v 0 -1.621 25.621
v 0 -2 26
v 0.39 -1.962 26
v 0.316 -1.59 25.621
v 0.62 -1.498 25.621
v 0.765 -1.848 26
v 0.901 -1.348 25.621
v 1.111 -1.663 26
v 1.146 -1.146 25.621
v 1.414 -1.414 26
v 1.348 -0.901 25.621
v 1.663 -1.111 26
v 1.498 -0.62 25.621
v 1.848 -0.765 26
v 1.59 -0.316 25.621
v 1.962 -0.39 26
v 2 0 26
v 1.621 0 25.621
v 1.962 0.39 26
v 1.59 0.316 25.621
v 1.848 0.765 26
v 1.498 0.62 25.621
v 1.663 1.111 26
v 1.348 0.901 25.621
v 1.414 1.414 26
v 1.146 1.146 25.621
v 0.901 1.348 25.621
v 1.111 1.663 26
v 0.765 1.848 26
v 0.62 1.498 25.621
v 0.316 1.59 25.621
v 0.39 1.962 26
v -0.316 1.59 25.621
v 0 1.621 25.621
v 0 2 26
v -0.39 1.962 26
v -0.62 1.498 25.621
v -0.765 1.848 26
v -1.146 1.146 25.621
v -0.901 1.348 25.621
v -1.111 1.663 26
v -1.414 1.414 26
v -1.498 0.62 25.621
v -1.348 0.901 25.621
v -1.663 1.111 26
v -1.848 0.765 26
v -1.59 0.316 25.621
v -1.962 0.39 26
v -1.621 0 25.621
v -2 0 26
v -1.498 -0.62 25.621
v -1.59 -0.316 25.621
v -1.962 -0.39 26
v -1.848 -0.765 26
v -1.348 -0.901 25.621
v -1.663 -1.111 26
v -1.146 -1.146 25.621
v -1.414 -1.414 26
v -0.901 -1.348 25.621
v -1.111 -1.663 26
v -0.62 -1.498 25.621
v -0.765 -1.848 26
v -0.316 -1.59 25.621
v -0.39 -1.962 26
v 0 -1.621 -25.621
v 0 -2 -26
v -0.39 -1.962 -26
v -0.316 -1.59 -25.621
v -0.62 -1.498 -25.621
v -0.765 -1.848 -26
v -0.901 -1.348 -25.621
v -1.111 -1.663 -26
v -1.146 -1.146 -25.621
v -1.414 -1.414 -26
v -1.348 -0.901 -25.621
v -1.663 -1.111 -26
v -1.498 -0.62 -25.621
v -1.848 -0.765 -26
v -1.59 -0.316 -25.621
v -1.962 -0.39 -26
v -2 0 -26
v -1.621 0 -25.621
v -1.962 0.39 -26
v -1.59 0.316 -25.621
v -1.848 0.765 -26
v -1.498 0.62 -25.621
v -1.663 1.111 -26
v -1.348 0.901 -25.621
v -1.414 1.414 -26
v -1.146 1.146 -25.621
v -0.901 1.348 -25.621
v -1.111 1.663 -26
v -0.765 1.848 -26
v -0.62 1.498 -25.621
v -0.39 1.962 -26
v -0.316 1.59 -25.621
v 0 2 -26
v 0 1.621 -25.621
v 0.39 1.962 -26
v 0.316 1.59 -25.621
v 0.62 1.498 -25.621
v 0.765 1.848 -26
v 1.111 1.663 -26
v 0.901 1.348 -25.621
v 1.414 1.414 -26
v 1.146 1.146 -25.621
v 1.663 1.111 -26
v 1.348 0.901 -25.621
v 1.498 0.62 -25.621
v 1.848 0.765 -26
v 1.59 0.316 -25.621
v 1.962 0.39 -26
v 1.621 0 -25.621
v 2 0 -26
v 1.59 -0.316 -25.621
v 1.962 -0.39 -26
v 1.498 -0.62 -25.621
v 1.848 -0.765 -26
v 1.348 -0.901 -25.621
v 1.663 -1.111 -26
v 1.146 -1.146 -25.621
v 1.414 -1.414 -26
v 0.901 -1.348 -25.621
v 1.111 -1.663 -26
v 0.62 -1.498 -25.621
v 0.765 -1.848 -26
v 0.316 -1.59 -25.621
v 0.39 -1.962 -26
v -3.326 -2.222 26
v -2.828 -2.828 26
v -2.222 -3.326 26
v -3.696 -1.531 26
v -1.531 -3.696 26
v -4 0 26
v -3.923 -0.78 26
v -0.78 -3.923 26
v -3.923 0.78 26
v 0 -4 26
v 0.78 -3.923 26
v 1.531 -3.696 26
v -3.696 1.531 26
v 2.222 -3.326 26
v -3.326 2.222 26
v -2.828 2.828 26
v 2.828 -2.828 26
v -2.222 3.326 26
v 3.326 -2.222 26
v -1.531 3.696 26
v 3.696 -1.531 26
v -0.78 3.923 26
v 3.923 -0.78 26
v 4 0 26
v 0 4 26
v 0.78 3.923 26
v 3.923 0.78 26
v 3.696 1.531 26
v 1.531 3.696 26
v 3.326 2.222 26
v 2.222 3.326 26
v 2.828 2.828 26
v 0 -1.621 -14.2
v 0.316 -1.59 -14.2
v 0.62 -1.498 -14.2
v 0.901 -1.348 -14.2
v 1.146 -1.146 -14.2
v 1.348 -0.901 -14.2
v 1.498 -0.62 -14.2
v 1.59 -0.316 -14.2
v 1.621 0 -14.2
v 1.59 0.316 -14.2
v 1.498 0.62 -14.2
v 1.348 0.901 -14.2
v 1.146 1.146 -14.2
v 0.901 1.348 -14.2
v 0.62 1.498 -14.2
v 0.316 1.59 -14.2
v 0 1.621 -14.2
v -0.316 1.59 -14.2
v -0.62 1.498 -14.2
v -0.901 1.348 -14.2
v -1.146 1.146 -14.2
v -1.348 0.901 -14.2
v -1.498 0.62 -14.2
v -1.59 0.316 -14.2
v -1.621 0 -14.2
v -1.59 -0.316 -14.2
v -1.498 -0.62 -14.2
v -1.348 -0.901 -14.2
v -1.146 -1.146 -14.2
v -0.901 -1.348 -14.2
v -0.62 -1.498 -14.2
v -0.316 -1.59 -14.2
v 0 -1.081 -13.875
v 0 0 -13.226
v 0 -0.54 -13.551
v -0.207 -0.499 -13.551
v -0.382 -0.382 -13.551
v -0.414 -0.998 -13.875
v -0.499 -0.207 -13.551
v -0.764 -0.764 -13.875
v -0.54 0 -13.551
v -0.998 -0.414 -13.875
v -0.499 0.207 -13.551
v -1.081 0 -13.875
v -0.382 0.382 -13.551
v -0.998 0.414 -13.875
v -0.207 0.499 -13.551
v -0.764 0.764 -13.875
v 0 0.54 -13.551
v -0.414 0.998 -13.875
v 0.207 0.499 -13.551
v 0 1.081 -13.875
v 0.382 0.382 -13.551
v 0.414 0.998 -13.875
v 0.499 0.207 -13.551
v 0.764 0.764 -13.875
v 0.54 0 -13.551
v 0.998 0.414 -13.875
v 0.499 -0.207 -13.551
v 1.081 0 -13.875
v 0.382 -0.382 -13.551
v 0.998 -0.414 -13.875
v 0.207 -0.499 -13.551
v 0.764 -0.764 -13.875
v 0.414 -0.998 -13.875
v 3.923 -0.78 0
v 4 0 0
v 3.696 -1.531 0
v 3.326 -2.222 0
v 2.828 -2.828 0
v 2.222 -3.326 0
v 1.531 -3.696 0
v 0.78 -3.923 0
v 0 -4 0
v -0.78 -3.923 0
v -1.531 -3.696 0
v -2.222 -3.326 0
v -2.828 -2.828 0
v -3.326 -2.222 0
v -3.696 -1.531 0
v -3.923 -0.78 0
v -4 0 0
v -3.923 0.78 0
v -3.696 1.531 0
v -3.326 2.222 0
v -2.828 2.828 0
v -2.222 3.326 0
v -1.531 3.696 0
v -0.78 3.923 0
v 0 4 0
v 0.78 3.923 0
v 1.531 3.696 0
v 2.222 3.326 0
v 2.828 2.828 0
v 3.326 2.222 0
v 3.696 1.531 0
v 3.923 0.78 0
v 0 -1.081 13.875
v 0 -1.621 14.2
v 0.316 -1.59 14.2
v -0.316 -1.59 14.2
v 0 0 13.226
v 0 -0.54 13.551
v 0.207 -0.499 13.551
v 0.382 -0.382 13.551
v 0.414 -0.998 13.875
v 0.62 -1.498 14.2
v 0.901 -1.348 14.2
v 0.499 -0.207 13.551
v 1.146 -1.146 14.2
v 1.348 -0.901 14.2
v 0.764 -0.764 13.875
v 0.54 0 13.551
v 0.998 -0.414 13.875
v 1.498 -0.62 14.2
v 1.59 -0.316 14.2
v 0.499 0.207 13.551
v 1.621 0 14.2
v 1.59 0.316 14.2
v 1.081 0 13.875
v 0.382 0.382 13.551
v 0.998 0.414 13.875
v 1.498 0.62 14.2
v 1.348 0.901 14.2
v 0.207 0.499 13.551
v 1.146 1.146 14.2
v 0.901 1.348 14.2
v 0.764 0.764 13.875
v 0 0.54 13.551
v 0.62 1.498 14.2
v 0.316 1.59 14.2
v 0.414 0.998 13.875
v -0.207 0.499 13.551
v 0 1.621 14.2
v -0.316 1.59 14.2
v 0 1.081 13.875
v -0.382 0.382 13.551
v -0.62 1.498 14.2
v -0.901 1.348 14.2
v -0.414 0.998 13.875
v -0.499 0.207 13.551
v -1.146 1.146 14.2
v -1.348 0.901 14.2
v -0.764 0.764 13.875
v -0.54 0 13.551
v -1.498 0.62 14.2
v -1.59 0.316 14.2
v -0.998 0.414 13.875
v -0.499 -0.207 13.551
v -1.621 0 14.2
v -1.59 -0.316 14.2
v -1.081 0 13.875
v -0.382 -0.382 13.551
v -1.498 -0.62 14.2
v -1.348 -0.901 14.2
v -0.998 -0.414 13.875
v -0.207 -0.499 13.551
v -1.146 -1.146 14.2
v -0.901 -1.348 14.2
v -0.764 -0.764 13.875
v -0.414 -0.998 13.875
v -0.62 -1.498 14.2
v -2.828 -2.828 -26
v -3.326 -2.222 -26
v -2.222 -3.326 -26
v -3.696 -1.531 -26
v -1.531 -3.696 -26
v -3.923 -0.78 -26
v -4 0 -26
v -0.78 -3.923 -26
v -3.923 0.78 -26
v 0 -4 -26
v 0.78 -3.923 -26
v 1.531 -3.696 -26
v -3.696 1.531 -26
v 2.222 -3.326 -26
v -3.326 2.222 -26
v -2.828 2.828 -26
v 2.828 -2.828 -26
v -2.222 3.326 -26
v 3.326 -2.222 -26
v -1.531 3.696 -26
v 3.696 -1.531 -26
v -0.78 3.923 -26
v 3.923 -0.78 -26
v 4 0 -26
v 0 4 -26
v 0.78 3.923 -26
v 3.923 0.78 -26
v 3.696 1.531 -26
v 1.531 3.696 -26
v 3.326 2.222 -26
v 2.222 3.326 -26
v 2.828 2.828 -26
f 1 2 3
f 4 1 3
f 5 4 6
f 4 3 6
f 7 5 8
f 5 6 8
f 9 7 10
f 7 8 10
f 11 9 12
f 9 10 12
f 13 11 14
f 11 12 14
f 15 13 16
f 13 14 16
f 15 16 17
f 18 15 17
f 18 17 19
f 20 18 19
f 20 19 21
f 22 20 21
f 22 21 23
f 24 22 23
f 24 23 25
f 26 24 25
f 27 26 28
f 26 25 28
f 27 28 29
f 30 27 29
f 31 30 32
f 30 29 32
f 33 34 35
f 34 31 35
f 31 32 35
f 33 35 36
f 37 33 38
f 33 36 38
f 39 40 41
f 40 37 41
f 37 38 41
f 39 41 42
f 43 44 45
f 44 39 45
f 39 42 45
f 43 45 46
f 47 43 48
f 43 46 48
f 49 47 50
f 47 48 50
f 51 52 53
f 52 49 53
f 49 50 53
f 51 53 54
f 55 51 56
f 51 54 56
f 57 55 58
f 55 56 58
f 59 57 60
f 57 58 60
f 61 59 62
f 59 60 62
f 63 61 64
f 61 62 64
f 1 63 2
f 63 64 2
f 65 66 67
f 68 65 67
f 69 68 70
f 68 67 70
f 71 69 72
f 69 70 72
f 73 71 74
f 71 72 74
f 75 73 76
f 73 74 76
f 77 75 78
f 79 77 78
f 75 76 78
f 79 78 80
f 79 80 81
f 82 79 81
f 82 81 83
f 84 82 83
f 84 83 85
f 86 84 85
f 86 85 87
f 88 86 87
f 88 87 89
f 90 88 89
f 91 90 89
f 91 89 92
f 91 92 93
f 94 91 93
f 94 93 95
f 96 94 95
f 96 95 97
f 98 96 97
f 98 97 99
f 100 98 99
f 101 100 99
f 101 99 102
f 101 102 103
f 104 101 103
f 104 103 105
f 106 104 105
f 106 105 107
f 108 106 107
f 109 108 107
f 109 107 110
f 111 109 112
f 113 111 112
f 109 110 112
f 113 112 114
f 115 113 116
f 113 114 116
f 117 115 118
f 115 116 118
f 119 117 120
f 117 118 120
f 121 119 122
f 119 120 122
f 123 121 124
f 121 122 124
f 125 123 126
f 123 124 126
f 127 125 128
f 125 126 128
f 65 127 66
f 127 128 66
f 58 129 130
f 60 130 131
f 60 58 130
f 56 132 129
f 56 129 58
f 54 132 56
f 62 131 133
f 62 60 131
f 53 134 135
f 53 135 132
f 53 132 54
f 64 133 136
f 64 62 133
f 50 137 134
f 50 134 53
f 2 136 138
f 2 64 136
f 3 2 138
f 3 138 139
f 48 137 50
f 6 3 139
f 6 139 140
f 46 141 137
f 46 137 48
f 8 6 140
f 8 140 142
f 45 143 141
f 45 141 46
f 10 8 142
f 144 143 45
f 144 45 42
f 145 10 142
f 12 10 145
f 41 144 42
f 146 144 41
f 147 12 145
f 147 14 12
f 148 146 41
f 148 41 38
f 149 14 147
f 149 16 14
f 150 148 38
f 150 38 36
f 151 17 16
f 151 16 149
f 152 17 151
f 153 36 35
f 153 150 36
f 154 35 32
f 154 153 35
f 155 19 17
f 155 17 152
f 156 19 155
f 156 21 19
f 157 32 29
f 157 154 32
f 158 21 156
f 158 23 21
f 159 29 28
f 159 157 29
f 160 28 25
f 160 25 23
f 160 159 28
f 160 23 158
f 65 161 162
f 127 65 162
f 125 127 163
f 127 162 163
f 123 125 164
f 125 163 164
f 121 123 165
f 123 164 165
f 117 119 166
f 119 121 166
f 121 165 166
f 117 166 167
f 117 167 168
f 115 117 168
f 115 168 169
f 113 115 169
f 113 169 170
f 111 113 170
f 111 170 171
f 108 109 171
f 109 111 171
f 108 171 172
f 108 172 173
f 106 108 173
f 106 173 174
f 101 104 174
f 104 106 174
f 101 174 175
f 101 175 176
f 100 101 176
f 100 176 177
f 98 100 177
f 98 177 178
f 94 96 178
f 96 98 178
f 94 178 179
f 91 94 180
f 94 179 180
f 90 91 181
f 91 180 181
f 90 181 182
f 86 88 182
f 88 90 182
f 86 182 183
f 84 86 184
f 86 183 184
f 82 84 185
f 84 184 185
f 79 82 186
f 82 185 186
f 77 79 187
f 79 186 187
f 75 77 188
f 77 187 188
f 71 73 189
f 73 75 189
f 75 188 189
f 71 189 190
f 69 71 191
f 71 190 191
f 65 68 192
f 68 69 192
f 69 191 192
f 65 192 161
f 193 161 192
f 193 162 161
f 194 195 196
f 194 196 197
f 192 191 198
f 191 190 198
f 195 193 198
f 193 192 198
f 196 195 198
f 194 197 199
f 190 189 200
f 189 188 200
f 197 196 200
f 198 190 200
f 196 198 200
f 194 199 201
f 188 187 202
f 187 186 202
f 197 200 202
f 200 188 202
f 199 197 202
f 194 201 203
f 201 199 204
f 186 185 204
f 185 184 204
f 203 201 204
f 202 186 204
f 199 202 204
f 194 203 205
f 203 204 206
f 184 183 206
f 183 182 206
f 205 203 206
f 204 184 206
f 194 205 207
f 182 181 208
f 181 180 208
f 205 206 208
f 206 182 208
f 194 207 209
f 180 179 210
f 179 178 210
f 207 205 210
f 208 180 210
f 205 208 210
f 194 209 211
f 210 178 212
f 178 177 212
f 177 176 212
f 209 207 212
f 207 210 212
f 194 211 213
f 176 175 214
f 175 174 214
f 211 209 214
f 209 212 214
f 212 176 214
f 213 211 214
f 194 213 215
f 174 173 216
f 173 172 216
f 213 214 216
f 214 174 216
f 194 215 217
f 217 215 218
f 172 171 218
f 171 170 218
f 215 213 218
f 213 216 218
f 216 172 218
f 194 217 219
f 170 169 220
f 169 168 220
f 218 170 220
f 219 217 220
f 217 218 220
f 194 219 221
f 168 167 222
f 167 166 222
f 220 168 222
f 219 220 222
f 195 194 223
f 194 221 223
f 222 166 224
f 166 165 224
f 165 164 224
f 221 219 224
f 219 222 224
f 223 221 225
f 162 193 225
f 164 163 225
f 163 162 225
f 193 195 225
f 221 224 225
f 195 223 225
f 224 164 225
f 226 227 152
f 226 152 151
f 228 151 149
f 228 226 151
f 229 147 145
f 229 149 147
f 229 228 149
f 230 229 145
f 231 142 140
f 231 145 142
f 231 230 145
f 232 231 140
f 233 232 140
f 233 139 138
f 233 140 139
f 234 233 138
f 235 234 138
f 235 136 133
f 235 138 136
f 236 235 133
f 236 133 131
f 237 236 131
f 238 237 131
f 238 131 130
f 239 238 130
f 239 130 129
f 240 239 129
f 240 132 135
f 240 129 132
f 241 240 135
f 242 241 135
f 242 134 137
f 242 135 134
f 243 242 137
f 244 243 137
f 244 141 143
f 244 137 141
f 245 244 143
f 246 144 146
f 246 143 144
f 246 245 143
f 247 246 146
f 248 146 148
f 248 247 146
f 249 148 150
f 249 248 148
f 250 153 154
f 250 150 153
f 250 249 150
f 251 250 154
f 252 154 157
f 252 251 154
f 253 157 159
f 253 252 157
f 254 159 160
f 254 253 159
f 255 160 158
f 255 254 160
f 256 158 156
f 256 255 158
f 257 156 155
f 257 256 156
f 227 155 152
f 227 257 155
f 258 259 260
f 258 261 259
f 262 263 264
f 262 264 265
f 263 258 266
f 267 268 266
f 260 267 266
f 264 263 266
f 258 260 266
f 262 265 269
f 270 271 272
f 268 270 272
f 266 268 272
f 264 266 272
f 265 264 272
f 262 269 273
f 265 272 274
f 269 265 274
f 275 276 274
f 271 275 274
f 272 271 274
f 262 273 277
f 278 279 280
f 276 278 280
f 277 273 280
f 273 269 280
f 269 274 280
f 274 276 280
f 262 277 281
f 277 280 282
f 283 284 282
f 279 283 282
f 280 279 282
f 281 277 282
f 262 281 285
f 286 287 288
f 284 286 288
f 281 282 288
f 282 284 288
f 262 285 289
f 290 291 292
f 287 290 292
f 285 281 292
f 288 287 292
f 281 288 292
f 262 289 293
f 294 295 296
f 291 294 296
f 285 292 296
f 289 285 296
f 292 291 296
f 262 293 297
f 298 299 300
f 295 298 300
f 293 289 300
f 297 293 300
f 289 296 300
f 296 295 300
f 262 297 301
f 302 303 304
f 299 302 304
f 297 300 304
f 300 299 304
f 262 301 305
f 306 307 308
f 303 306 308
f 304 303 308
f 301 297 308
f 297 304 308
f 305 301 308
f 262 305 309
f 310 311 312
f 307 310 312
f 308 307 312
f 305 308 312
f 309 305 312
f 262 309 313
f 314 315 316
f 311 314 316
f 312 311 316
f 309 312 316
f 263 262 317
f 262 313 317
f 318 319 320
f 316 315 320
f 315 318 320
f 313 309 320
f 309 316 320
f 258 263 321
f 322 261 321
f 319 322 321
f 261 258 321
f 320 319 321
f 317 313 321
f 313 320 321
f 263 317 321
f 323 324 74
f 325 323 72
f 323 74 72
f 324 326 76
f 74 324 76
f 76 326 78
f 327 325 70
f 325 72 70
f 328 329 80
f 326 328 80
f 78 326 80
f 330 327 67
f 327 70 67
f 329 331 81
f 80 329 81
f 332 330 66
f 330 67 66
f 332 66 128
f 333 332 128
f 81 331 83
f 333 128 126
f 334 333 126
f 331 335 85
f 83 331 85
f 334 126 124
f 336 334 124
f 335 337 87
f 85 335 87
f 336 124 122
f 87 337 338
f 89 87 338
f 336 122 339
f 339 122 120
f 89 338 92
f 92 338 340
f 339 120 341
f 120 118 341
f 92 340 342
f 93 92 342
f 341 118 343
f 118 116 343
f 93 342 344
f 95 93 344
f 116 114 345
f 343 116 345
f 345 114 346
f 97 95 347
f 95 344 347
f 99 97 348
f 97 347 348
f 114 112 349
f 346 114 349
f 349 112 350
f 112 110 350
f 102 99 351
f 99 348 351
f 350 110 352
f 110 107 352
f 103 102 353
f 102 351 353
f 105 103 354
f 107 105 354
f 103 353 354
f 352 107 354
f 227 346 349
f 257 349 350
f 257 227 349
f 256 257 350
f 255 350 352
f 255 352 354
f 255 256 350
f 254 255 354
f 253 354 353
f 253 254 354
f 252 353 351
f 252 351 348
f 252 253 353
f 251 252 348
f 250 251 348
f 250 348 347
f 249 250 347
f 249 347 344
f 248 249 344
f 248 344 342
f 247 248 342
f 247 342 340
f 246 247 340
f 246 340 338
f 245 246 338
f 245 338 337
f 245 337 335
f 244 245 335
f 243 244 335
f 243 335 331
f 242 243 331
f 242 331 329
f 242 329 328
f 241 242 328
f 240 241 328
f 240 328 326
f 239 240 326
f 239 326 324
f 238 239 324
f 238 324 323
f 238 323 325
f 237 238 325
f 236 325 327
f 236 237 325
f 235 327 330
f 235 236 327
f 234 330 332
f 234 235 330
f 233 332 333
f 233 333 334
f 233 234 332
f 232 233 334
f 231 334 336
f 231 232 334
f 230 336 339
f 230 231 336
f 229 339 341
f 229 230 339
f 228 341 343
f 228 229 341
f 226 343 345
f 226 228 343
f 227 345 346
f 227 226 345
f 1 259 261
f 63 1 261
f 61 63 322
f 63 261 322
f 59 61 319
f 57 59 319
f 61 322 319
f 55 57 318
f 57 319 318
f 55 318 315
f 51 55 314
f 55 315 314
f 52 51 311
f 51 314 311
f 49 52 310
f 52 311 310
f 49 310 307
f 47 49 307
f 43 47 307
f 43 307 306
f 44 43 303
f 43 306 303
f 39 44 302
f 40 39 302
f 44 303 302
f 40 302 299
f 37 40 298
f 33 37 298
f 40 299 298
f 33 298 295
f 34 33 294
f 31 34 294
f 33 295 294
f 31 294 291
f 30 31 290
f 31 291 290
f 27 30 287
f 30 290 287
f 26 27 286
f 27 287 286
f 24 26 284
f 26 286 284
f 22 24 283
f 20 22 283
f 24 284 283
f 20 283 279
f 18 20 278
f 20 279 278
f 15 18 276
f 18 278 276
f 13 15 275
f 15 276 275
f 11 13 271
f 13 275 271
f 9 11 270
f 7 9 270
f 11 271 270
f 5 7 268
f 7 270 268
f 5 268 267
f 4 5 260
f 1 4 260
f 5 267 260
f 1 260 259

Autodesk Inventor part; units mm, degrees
ref_plane "YZ Plane" through (0, 0, 0) normal (1, 0, 0) x (0, 1, 0)
ref_plane "XZ Plane" through (0, 0, 0) normal (0, 1, 0) x (-1, 0, 0)
ref_plane "XY Plane" through (0, 0, 0) normal (0, 0, 1) x (1, 0, 0)
sketch "Sketch1" plane through (0, 0, 0) normal (0, 0, 1) x (1, 0, 0)
  circle A0 centre (0, 0) radius 4
  dimension "d0" = 8
extrude "Extrusion1" add sketch "Sketch1" along normal mid plane 52
sketch "Sketch2" plane through (0, 0, 26) normal (0, 0, 1) x (1, 0, 0)
  point P0 (0, 0)
  point P1 (0, 0)
hole "Hole1" at (0, 0, 26) direction (0, 0, -1) diameter 3.242 depth 11.8 tip angle 118 countersink diameter 4 countersink angle 90 thread size "M4x0.7" class "6H" standard "ANSI Metric M Profile"
mirror "Mirror1" about plane through (0, 0, 0) normal (0, 0, 1) of "Hole1"
properties part number "vul as platen"
